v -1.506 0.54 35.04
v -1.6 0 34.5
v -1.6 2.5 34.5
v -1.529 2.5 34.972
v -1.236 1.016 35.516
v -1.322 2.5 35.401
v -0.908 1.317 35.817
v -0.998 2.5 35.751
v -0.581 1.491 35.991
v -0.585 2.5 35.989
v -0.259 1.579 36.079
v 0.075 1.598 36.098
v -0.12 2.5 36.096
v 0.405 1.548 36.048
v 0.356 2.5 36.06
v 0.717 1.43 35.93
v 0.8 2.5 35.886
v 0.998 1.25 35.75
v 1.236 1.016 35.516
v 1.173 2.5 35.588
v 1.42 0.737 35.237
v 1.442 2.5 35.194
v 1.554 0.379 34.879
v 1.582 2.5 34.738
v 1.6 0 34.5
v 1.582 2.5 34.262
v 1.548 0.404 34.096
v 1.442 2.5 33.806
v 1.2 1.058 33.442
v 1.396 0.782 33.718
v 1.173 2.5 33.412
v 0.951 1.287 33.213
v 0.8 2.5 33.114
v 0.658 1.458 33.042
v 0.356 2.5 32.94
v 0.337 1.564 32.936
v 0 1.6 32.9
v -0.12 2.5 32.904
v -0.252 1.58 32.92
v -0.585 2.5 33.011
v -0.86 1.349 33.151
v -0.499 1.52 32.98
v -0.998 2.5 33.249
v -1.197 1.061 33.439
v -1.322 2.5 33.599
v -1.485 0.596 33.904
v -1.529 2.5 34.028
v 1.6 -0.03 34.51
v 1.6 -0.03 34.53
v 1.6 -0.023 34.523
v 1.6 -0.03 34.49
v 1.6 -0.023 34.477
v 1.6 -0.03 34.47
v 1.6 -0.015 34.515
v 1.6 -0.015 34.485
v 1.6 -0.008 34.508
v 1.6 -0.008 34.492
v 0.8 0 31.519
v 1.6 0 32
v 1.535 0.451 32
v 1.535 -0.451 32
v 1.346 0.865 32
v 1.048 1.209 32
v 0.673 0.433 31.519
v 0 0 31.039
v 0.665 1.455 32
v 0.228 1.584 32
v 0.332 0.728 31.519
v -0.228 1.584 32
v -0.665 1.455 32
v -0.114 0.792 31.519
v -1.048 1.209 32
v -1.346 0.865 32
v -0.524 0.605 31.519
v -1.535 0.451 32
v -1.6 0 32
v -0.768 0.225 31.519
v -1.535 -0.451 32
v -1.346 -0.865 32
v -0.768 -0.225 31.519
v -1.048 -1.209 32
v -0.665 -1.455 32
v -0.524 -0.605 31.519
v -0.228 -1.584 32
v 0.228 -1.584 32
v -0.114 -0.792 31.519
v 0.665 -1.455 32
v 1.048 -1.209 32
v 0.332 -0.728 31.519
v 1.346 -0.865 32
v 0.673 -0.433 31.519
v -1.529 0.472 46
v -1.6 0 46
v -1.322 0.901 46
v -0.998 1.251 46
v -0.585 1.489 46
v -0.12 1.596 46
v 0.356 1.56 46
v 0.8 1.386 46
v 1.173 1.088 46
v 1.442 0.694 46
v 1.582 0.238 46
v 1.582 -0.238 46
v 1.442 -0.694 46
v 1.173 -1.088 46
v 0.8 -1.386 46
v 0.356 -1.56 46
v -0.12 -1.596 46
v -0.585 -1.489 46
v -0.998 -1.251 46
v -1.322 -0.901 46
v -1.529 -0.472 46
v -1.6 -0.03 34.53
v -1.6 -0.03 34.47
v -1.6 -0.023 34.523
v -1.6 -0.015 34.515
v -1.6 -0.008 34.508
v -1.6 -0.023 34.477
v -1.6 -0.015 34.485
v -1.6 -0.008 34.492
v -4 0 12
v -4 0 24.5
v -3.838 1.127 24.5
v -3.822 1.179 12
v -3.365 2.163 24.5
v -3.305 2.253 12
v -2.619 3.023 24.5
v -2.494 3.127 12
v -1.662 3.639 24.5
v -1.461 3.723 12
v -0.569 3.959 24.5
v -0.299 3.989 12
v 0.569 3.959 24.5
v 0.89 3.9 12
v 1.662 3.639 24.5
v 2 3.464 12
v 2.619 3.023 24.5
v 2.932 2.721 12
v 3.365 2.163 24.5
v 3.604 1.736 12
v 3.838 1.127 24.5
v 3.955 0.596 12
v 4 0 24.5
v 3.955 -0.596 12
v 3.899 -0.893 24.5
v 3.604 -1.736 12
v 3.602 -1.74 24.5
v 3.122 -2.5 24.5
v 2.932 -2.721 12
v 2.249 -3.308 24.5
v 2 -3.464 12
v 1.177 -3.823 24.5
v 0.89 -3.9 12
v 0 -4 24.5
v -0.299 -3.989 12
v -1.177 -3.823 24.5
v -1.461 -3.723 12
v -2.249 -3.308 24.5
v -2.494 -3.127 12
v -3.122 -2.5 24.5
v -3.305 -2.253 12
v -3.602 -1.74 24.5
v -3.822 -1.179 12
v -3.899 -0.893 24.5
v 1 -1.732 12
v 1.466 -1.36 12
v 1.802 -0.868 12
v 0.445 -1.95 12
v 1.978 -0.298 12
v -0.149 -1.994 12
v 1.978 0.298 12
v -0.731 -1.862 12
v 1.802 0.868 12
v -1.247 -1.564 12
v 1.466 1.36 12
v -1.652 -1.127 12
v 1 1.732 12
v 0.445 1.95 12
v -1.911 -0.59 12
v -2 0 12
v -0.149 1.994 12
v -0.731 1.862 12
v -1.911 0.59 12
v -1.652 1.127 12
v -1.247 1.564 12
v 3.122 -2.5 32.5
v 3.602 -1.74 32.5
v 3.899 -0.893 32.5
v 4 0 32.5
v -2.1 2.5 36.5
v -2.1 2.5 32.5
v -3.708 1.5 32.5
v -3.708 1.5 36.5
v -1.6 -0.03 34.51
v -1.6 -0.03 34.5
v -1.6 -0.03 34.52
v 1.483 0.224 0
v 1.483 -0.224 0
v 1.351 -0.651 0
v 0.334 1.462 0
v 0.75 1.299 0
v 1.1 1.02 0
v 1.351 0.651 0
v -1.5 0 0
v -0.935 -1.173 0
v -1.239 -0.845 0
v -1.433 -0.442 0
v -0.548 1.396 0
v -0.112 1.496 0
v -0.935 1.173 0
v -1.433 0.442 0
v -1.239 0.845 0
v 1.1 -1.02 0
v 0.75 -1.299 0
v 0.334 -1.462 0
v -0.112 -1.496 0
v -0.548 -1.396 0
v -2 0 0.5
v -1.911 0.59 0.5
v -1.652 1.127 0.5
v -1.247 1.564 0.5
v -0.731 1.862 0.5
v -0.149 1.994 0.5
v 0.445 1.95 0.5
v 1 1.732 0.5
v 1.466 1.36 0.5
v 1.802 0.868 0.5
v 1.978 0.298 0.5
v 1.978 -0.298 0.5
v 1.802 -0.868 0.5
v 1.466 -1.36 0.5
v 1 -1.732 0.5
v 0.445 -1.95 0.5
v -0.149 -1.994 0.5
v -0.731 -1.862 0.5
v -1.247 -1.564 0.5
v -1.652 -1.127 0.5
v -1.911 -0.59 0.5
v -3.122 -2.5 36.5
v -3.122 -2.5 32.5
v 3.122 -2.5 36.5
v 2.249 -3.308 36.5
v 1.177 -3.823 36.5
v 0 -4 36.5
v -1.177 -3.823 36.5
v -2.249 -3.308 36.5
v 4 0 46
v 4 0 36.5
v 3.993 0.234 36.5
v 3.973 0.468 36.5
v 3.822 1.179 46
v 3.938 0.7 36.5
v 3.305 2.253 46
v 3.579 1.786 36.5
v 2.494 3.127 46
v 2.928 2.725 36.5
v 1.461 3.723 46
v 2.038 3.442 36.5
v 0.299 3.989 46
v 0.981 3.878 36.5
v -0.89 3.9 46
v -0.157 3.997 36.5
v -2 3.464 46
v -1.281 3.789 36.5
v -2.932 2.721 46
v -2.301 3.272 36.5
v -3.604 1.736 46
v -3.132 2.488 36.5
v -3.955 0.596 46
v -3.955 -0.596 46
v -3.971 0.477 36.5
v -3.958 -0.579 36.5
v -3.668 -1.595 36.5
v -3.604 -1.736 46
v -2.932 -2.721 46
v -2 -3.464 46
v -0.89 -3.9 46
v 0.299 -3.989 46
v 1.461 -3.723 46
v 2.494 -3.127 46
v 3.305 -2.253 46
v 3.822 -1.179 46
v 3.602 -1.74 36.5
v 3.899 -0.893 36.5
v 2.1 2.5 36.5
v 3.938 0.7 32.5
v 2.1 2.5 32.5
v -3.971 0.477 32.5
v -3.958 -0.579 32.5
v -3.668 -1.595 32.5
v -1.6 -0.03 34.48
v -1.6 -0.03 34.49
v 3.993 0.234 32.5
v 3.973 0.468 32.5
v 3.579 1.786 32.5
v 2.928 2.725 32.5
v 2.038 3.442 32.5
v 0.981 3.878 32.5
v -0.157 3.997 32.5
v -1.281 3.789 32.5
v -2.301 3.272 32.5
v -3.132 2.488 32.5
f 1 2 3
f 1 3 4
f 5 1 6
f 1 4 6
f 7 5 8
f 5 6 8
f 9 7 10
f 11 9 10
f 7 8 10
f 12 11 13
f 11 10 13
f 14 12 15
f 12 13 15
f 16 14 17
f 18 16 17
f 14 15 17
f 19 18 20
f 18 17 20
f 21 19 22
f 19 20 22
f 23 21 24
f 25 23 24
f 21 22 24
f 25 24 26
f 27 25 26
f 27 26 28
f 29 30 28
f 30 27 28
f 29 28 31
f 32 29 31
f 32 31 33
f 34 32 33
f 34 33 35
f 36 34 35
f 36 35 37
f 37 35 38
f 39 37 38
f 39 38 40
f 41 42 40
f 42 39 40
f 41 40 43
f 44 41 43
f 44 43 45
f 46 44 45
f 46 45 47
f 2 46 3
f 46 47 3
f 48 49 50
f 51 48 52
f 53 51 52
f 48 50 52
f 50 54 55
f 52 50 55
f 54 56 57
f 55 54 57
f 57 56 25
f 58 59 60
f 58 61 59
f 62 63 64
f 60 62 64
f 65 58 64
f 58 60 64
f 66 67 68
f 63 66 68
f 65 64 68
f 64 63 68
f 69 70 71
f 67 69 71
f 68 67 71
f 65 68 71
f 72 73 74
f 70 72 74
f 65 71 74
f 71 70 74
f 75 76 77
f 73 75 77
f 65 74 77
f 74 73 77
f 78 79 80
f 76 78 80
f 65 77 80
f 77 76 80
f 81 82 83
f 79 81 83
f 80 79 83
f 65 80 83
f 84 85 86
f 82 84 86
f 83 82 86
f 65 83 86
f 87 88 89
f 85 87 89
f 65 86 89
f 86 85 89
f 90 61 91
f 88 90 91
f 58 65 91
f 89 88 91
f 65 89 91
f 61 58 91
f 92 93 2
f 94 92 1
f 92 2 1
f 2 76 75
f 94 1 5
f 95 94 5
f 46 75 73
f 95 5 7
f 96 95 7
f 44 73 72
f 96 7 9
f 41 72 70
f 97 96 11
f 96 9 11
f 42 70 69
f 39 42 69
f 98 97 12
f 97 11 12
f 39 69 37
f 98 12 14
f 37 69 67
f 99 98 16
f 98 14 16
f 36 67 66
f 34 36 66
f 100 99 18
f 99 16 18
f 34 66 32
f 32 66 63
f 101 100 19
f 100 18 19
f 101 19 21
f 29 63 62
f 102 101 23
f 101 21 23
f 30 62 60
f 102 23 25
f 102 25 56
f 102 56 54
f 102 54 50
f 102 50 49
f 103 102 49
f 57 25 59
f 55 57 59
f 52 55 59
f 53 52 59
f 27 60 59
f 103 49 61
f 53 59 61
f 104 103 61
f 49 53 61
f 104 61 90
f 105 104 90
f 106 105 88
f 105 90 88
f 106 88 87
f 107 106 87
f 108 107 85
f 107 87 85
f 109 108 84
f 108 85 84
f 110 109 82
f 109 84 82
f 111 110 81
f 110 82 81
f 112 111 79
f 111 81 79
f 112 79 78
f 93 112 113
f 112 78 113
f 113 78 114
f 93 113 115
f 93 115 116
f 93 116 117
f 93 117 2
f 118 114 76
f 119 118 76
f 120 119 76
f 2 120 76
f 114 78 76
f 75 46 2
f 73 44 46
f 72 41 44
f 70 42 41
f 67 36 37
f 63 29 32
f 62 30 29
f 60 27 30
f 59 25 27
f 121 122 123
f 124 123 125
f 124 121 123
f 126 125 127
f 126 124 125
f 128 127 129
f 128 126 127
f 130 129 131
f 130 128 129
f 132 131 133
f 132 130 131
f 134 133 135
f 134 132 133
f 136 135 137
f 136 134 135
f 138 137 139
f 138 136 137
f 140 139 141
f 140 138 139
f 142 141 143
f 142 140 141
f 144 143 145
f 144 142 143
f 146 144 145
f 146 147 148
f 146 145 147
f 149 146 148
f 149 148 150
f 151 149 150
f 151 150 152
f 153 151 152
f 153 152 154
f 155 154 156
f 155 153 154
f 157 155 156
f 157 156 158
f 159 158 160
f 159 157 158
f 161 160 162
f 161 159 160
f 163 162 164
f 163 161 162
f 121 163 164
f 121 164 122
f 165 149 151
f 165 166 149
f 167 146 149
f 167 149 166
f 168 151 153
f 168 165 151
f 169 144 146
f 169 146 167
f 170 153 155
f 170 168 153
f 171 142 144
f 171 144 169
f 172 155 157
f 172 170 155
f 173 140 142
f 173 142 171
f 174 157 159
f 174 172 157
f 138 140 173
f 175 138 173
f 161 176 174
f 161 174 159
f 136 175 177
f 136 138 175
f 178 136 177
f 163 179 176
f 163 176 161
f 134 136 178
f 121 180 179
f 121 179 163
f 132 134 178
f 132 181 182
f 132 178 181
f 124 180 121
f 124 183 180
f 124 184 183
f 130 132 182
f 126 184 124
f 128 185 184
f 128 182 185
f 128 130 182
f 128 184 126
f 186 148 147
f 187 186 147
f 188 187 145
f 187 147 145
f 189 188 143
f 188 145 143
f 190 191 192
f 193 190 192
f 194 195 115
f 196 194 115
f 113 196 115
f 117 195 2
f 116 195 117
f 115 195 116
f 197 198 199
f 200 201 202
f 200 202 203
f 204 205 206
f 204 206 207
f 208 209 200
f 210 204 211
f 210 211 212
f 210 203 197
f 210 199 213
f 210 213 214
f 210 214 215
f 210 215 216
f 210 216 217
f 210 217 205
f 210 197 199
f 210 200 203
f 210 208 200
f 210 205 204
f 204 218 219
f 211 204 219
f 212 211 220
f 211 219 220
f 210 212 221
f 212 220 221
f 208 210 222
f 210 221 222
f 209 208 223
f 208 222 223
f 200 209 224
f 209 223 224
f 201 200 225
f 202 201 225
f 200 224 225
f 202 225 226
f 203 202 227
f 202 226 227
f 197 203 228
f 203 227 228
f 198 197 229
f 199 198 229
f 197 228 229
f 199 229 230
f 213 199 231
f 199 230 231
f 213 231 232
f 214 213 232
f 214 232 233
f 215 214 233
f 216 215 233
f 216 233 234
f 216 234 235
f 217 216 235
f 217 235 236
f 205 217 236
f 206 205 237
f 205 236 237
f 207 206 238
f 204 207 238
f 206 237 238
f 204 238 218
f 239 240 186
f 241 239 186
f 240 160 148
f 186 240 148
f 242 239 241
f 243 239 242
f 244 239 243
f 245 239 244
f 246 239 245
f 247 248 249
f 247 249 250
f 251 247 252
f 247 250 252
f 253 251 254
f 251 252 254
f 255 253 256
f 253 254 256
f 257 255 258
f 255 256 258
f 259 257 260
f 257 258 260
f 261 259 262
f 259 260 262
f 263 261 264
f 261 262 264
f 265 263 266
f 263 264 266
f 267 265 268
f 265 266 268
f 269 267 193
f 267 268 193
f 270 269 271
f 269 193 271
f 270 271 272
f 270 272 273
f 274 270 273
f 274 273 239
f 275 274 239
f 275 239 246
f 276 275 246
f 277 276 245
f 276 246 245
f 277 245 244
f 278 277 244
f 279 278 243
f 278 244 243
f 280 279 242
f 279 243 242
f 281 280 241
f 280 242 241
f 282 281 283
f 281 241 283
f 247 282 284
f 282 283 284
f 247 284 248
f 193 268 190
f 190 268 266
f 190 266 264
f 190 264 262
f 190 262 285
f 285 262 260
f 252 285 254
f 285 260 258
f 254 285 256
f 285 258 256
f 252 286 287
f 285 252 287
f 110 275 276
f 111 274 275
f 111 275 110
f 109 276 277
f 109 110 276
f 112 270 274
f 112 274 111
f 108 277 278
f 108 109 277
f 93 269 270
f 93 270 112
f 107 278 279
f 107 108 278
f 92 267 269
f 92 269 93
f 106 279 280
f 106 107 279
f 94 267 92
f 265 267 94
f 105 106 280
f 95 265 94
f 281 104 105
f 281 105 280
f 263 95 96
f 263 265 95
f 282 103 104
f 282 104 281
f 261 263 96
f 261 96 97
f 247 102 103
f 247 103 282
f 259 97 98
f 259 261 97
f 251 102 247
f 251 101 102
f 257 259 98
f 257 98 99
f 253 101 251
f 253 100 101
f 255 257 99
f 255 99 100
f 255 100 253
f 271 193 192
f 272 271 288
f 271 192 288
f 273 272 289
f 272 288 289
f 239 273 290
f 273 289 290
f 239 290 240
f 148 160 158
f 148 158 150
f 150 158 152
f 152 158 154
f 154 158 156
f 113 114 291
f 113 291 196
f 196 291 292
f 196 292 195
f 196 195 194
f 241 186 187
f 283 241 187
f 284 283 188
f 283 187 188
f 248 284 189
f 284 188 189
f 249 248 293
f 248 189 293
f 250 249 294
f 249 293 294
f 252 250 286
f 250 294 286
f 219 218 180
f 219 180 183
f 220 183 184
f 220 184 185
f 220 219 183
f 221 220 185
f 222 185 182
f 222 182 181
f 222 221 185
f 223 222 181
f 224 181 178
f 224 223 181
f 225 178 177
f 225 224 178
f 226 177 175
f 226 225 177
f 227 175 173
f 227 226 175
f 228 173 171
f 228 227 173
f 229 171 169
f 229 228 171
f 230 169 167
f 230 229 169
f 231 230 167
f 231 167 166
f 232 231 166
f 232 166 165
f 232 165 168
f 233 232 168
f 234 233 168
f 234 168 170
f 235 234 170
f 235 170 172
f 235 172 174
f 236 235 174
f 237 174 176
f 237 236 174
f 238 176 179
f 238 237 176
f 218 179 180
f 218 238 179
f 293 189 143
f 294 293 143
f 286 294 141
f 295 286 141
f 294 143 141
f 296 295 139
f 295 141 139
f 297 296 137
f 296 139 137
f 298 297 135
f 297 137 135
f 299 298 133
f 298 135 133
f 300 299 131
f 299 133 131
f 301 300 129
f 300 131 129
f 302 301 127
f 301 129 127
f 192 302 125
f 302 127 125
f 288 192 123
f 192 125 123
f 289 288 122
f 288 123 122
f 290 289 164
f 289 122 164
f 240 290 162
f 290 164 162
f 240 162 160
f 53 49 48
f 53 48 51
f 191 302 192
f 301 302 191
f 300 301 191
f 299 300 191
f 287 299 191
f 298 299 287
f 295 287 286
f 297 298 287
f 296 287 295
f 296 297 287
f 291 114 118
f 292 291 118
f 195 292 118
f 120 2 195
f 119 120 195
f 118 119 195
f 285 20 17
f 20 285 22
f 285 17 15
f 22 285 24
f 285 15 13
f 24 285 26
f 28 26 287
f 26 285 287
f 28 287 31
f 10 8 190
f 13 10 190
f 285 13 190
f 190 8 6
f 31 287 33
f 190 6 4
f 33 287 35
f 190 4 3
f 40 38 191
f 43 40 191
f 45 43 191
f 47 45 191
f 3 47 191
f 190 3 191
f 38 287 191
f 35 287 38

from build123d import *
from build123d import SkipClean  # not in build123d's __all__

# Parameters (mm, degrees)
F2_SIZE   = 0.5
F4_DEPTH  = 8
F6_DEPTH  = 4
F7_R      = 4
F8_DEPTH  = 9.5
F10_D     = 3.2
F10_DEPTH = 14
F10_TIP   = 0.9613769904
F11_R     = 1.6
F12_DEPTH = 2.53


# Not quite as in the source:
# - after a boolean that leaves OpenCascade's solid faulty, fix() repairs it


with BuildPart() as f1:
    # F0 (on Front) → F1 (revolve)
    with BuildSketch(Plane.XZ):
        Polygon((-2, 0), (0, 0), (0, 24.5), (-4, 24.5), (-4, 12), (-2, 12), align=None)
    revolve(axis=Axis((0, 0, 12.25), (0, 0, -1)))

    # F2
    f2_edges = [f1.edges().sort_by_distance(p)[0] for p in [
        (2, 0, 0),
    ]]
    chamfer(f2_edges, length=F2_SIZE)

    # F3 (on face) → F4 (join)
    with BuildSketch(Plane.XY.offset(24.5)):
        with BuildLine():
            Line((-3.1224989992, -2.5), (3.1224989992, -2.5))
            ThreePointArc((3.1224989992, -2.5), (3.7742546282, -1.3247648854), (4, 0))
            ThreePointArc((4, 0), (-1.3247648854, 3.7742546282), (-3.1224989992, -2.5))
        make_face()
    with SkipClean():  # cleaning this boolean's faces spoils the solid; the shape is the same uncleaned
        extrude(amount=F4_DEPTH)

    # F5 (on face) → F6 (join)
    with BuildSketch(Plane.XY.offset(32.5)):
        with BuildLine():
            Line((-3.1224989992, -2.5), (3.1224989992, -2.5))
            ThreePointArc((3.1224989992, -2.5), (3.8760324942, -0.9881154306), (3.9382737335, 0.7))
            Line((3.9382737335, 0.7), (2.1, 2.5))
            Line((2.1, 2.5), (-2.1, 2.5))
            Line((-2.1, 2.5), (-3.7080992435, 1.5))
            ThreePointArc((-3.7080992435, 1.5), (-3.9578110223, -0.5794237754), (-3.1224989992, -2.5))
        make_face()
    extrude(amount=F6_DEPTH)

    add(f1.part.fix(), mode=Mode.REPLACE)

    # F7 (on face) → F8 (join)
    with BuildSketch(Plane.XY.offset(36.5)):
        Circle(F7_R)
    extrude(amount=F8_DEPTH)

    # F10
    with Locations(Plane.XY.offset(46)):
        with Locations((0, 0)):
            Hole(F10_D / 2, depth=F10_DEPTH)
            with Locations((0, 0, -(F10_DEPTH + F10_TIP / 2))):  # 118° drill point
                Cone(0, F10_D / 2, F10_TIP, mode=Mode.SUBTRACT)

    # F11 (on face) → F12 (cut)
    with BuildSketch(Plane(origin=(0, 2.5, 0), x_dir=(-1, 0, 0), z_dir=(0, 1, 0))):
        with Locations((0, 34.5)):
            Circle(F11_R)
    extrude(amount=-F12_DEPTH, mode=Mode.SUBTRACT)


solid = f1.part
